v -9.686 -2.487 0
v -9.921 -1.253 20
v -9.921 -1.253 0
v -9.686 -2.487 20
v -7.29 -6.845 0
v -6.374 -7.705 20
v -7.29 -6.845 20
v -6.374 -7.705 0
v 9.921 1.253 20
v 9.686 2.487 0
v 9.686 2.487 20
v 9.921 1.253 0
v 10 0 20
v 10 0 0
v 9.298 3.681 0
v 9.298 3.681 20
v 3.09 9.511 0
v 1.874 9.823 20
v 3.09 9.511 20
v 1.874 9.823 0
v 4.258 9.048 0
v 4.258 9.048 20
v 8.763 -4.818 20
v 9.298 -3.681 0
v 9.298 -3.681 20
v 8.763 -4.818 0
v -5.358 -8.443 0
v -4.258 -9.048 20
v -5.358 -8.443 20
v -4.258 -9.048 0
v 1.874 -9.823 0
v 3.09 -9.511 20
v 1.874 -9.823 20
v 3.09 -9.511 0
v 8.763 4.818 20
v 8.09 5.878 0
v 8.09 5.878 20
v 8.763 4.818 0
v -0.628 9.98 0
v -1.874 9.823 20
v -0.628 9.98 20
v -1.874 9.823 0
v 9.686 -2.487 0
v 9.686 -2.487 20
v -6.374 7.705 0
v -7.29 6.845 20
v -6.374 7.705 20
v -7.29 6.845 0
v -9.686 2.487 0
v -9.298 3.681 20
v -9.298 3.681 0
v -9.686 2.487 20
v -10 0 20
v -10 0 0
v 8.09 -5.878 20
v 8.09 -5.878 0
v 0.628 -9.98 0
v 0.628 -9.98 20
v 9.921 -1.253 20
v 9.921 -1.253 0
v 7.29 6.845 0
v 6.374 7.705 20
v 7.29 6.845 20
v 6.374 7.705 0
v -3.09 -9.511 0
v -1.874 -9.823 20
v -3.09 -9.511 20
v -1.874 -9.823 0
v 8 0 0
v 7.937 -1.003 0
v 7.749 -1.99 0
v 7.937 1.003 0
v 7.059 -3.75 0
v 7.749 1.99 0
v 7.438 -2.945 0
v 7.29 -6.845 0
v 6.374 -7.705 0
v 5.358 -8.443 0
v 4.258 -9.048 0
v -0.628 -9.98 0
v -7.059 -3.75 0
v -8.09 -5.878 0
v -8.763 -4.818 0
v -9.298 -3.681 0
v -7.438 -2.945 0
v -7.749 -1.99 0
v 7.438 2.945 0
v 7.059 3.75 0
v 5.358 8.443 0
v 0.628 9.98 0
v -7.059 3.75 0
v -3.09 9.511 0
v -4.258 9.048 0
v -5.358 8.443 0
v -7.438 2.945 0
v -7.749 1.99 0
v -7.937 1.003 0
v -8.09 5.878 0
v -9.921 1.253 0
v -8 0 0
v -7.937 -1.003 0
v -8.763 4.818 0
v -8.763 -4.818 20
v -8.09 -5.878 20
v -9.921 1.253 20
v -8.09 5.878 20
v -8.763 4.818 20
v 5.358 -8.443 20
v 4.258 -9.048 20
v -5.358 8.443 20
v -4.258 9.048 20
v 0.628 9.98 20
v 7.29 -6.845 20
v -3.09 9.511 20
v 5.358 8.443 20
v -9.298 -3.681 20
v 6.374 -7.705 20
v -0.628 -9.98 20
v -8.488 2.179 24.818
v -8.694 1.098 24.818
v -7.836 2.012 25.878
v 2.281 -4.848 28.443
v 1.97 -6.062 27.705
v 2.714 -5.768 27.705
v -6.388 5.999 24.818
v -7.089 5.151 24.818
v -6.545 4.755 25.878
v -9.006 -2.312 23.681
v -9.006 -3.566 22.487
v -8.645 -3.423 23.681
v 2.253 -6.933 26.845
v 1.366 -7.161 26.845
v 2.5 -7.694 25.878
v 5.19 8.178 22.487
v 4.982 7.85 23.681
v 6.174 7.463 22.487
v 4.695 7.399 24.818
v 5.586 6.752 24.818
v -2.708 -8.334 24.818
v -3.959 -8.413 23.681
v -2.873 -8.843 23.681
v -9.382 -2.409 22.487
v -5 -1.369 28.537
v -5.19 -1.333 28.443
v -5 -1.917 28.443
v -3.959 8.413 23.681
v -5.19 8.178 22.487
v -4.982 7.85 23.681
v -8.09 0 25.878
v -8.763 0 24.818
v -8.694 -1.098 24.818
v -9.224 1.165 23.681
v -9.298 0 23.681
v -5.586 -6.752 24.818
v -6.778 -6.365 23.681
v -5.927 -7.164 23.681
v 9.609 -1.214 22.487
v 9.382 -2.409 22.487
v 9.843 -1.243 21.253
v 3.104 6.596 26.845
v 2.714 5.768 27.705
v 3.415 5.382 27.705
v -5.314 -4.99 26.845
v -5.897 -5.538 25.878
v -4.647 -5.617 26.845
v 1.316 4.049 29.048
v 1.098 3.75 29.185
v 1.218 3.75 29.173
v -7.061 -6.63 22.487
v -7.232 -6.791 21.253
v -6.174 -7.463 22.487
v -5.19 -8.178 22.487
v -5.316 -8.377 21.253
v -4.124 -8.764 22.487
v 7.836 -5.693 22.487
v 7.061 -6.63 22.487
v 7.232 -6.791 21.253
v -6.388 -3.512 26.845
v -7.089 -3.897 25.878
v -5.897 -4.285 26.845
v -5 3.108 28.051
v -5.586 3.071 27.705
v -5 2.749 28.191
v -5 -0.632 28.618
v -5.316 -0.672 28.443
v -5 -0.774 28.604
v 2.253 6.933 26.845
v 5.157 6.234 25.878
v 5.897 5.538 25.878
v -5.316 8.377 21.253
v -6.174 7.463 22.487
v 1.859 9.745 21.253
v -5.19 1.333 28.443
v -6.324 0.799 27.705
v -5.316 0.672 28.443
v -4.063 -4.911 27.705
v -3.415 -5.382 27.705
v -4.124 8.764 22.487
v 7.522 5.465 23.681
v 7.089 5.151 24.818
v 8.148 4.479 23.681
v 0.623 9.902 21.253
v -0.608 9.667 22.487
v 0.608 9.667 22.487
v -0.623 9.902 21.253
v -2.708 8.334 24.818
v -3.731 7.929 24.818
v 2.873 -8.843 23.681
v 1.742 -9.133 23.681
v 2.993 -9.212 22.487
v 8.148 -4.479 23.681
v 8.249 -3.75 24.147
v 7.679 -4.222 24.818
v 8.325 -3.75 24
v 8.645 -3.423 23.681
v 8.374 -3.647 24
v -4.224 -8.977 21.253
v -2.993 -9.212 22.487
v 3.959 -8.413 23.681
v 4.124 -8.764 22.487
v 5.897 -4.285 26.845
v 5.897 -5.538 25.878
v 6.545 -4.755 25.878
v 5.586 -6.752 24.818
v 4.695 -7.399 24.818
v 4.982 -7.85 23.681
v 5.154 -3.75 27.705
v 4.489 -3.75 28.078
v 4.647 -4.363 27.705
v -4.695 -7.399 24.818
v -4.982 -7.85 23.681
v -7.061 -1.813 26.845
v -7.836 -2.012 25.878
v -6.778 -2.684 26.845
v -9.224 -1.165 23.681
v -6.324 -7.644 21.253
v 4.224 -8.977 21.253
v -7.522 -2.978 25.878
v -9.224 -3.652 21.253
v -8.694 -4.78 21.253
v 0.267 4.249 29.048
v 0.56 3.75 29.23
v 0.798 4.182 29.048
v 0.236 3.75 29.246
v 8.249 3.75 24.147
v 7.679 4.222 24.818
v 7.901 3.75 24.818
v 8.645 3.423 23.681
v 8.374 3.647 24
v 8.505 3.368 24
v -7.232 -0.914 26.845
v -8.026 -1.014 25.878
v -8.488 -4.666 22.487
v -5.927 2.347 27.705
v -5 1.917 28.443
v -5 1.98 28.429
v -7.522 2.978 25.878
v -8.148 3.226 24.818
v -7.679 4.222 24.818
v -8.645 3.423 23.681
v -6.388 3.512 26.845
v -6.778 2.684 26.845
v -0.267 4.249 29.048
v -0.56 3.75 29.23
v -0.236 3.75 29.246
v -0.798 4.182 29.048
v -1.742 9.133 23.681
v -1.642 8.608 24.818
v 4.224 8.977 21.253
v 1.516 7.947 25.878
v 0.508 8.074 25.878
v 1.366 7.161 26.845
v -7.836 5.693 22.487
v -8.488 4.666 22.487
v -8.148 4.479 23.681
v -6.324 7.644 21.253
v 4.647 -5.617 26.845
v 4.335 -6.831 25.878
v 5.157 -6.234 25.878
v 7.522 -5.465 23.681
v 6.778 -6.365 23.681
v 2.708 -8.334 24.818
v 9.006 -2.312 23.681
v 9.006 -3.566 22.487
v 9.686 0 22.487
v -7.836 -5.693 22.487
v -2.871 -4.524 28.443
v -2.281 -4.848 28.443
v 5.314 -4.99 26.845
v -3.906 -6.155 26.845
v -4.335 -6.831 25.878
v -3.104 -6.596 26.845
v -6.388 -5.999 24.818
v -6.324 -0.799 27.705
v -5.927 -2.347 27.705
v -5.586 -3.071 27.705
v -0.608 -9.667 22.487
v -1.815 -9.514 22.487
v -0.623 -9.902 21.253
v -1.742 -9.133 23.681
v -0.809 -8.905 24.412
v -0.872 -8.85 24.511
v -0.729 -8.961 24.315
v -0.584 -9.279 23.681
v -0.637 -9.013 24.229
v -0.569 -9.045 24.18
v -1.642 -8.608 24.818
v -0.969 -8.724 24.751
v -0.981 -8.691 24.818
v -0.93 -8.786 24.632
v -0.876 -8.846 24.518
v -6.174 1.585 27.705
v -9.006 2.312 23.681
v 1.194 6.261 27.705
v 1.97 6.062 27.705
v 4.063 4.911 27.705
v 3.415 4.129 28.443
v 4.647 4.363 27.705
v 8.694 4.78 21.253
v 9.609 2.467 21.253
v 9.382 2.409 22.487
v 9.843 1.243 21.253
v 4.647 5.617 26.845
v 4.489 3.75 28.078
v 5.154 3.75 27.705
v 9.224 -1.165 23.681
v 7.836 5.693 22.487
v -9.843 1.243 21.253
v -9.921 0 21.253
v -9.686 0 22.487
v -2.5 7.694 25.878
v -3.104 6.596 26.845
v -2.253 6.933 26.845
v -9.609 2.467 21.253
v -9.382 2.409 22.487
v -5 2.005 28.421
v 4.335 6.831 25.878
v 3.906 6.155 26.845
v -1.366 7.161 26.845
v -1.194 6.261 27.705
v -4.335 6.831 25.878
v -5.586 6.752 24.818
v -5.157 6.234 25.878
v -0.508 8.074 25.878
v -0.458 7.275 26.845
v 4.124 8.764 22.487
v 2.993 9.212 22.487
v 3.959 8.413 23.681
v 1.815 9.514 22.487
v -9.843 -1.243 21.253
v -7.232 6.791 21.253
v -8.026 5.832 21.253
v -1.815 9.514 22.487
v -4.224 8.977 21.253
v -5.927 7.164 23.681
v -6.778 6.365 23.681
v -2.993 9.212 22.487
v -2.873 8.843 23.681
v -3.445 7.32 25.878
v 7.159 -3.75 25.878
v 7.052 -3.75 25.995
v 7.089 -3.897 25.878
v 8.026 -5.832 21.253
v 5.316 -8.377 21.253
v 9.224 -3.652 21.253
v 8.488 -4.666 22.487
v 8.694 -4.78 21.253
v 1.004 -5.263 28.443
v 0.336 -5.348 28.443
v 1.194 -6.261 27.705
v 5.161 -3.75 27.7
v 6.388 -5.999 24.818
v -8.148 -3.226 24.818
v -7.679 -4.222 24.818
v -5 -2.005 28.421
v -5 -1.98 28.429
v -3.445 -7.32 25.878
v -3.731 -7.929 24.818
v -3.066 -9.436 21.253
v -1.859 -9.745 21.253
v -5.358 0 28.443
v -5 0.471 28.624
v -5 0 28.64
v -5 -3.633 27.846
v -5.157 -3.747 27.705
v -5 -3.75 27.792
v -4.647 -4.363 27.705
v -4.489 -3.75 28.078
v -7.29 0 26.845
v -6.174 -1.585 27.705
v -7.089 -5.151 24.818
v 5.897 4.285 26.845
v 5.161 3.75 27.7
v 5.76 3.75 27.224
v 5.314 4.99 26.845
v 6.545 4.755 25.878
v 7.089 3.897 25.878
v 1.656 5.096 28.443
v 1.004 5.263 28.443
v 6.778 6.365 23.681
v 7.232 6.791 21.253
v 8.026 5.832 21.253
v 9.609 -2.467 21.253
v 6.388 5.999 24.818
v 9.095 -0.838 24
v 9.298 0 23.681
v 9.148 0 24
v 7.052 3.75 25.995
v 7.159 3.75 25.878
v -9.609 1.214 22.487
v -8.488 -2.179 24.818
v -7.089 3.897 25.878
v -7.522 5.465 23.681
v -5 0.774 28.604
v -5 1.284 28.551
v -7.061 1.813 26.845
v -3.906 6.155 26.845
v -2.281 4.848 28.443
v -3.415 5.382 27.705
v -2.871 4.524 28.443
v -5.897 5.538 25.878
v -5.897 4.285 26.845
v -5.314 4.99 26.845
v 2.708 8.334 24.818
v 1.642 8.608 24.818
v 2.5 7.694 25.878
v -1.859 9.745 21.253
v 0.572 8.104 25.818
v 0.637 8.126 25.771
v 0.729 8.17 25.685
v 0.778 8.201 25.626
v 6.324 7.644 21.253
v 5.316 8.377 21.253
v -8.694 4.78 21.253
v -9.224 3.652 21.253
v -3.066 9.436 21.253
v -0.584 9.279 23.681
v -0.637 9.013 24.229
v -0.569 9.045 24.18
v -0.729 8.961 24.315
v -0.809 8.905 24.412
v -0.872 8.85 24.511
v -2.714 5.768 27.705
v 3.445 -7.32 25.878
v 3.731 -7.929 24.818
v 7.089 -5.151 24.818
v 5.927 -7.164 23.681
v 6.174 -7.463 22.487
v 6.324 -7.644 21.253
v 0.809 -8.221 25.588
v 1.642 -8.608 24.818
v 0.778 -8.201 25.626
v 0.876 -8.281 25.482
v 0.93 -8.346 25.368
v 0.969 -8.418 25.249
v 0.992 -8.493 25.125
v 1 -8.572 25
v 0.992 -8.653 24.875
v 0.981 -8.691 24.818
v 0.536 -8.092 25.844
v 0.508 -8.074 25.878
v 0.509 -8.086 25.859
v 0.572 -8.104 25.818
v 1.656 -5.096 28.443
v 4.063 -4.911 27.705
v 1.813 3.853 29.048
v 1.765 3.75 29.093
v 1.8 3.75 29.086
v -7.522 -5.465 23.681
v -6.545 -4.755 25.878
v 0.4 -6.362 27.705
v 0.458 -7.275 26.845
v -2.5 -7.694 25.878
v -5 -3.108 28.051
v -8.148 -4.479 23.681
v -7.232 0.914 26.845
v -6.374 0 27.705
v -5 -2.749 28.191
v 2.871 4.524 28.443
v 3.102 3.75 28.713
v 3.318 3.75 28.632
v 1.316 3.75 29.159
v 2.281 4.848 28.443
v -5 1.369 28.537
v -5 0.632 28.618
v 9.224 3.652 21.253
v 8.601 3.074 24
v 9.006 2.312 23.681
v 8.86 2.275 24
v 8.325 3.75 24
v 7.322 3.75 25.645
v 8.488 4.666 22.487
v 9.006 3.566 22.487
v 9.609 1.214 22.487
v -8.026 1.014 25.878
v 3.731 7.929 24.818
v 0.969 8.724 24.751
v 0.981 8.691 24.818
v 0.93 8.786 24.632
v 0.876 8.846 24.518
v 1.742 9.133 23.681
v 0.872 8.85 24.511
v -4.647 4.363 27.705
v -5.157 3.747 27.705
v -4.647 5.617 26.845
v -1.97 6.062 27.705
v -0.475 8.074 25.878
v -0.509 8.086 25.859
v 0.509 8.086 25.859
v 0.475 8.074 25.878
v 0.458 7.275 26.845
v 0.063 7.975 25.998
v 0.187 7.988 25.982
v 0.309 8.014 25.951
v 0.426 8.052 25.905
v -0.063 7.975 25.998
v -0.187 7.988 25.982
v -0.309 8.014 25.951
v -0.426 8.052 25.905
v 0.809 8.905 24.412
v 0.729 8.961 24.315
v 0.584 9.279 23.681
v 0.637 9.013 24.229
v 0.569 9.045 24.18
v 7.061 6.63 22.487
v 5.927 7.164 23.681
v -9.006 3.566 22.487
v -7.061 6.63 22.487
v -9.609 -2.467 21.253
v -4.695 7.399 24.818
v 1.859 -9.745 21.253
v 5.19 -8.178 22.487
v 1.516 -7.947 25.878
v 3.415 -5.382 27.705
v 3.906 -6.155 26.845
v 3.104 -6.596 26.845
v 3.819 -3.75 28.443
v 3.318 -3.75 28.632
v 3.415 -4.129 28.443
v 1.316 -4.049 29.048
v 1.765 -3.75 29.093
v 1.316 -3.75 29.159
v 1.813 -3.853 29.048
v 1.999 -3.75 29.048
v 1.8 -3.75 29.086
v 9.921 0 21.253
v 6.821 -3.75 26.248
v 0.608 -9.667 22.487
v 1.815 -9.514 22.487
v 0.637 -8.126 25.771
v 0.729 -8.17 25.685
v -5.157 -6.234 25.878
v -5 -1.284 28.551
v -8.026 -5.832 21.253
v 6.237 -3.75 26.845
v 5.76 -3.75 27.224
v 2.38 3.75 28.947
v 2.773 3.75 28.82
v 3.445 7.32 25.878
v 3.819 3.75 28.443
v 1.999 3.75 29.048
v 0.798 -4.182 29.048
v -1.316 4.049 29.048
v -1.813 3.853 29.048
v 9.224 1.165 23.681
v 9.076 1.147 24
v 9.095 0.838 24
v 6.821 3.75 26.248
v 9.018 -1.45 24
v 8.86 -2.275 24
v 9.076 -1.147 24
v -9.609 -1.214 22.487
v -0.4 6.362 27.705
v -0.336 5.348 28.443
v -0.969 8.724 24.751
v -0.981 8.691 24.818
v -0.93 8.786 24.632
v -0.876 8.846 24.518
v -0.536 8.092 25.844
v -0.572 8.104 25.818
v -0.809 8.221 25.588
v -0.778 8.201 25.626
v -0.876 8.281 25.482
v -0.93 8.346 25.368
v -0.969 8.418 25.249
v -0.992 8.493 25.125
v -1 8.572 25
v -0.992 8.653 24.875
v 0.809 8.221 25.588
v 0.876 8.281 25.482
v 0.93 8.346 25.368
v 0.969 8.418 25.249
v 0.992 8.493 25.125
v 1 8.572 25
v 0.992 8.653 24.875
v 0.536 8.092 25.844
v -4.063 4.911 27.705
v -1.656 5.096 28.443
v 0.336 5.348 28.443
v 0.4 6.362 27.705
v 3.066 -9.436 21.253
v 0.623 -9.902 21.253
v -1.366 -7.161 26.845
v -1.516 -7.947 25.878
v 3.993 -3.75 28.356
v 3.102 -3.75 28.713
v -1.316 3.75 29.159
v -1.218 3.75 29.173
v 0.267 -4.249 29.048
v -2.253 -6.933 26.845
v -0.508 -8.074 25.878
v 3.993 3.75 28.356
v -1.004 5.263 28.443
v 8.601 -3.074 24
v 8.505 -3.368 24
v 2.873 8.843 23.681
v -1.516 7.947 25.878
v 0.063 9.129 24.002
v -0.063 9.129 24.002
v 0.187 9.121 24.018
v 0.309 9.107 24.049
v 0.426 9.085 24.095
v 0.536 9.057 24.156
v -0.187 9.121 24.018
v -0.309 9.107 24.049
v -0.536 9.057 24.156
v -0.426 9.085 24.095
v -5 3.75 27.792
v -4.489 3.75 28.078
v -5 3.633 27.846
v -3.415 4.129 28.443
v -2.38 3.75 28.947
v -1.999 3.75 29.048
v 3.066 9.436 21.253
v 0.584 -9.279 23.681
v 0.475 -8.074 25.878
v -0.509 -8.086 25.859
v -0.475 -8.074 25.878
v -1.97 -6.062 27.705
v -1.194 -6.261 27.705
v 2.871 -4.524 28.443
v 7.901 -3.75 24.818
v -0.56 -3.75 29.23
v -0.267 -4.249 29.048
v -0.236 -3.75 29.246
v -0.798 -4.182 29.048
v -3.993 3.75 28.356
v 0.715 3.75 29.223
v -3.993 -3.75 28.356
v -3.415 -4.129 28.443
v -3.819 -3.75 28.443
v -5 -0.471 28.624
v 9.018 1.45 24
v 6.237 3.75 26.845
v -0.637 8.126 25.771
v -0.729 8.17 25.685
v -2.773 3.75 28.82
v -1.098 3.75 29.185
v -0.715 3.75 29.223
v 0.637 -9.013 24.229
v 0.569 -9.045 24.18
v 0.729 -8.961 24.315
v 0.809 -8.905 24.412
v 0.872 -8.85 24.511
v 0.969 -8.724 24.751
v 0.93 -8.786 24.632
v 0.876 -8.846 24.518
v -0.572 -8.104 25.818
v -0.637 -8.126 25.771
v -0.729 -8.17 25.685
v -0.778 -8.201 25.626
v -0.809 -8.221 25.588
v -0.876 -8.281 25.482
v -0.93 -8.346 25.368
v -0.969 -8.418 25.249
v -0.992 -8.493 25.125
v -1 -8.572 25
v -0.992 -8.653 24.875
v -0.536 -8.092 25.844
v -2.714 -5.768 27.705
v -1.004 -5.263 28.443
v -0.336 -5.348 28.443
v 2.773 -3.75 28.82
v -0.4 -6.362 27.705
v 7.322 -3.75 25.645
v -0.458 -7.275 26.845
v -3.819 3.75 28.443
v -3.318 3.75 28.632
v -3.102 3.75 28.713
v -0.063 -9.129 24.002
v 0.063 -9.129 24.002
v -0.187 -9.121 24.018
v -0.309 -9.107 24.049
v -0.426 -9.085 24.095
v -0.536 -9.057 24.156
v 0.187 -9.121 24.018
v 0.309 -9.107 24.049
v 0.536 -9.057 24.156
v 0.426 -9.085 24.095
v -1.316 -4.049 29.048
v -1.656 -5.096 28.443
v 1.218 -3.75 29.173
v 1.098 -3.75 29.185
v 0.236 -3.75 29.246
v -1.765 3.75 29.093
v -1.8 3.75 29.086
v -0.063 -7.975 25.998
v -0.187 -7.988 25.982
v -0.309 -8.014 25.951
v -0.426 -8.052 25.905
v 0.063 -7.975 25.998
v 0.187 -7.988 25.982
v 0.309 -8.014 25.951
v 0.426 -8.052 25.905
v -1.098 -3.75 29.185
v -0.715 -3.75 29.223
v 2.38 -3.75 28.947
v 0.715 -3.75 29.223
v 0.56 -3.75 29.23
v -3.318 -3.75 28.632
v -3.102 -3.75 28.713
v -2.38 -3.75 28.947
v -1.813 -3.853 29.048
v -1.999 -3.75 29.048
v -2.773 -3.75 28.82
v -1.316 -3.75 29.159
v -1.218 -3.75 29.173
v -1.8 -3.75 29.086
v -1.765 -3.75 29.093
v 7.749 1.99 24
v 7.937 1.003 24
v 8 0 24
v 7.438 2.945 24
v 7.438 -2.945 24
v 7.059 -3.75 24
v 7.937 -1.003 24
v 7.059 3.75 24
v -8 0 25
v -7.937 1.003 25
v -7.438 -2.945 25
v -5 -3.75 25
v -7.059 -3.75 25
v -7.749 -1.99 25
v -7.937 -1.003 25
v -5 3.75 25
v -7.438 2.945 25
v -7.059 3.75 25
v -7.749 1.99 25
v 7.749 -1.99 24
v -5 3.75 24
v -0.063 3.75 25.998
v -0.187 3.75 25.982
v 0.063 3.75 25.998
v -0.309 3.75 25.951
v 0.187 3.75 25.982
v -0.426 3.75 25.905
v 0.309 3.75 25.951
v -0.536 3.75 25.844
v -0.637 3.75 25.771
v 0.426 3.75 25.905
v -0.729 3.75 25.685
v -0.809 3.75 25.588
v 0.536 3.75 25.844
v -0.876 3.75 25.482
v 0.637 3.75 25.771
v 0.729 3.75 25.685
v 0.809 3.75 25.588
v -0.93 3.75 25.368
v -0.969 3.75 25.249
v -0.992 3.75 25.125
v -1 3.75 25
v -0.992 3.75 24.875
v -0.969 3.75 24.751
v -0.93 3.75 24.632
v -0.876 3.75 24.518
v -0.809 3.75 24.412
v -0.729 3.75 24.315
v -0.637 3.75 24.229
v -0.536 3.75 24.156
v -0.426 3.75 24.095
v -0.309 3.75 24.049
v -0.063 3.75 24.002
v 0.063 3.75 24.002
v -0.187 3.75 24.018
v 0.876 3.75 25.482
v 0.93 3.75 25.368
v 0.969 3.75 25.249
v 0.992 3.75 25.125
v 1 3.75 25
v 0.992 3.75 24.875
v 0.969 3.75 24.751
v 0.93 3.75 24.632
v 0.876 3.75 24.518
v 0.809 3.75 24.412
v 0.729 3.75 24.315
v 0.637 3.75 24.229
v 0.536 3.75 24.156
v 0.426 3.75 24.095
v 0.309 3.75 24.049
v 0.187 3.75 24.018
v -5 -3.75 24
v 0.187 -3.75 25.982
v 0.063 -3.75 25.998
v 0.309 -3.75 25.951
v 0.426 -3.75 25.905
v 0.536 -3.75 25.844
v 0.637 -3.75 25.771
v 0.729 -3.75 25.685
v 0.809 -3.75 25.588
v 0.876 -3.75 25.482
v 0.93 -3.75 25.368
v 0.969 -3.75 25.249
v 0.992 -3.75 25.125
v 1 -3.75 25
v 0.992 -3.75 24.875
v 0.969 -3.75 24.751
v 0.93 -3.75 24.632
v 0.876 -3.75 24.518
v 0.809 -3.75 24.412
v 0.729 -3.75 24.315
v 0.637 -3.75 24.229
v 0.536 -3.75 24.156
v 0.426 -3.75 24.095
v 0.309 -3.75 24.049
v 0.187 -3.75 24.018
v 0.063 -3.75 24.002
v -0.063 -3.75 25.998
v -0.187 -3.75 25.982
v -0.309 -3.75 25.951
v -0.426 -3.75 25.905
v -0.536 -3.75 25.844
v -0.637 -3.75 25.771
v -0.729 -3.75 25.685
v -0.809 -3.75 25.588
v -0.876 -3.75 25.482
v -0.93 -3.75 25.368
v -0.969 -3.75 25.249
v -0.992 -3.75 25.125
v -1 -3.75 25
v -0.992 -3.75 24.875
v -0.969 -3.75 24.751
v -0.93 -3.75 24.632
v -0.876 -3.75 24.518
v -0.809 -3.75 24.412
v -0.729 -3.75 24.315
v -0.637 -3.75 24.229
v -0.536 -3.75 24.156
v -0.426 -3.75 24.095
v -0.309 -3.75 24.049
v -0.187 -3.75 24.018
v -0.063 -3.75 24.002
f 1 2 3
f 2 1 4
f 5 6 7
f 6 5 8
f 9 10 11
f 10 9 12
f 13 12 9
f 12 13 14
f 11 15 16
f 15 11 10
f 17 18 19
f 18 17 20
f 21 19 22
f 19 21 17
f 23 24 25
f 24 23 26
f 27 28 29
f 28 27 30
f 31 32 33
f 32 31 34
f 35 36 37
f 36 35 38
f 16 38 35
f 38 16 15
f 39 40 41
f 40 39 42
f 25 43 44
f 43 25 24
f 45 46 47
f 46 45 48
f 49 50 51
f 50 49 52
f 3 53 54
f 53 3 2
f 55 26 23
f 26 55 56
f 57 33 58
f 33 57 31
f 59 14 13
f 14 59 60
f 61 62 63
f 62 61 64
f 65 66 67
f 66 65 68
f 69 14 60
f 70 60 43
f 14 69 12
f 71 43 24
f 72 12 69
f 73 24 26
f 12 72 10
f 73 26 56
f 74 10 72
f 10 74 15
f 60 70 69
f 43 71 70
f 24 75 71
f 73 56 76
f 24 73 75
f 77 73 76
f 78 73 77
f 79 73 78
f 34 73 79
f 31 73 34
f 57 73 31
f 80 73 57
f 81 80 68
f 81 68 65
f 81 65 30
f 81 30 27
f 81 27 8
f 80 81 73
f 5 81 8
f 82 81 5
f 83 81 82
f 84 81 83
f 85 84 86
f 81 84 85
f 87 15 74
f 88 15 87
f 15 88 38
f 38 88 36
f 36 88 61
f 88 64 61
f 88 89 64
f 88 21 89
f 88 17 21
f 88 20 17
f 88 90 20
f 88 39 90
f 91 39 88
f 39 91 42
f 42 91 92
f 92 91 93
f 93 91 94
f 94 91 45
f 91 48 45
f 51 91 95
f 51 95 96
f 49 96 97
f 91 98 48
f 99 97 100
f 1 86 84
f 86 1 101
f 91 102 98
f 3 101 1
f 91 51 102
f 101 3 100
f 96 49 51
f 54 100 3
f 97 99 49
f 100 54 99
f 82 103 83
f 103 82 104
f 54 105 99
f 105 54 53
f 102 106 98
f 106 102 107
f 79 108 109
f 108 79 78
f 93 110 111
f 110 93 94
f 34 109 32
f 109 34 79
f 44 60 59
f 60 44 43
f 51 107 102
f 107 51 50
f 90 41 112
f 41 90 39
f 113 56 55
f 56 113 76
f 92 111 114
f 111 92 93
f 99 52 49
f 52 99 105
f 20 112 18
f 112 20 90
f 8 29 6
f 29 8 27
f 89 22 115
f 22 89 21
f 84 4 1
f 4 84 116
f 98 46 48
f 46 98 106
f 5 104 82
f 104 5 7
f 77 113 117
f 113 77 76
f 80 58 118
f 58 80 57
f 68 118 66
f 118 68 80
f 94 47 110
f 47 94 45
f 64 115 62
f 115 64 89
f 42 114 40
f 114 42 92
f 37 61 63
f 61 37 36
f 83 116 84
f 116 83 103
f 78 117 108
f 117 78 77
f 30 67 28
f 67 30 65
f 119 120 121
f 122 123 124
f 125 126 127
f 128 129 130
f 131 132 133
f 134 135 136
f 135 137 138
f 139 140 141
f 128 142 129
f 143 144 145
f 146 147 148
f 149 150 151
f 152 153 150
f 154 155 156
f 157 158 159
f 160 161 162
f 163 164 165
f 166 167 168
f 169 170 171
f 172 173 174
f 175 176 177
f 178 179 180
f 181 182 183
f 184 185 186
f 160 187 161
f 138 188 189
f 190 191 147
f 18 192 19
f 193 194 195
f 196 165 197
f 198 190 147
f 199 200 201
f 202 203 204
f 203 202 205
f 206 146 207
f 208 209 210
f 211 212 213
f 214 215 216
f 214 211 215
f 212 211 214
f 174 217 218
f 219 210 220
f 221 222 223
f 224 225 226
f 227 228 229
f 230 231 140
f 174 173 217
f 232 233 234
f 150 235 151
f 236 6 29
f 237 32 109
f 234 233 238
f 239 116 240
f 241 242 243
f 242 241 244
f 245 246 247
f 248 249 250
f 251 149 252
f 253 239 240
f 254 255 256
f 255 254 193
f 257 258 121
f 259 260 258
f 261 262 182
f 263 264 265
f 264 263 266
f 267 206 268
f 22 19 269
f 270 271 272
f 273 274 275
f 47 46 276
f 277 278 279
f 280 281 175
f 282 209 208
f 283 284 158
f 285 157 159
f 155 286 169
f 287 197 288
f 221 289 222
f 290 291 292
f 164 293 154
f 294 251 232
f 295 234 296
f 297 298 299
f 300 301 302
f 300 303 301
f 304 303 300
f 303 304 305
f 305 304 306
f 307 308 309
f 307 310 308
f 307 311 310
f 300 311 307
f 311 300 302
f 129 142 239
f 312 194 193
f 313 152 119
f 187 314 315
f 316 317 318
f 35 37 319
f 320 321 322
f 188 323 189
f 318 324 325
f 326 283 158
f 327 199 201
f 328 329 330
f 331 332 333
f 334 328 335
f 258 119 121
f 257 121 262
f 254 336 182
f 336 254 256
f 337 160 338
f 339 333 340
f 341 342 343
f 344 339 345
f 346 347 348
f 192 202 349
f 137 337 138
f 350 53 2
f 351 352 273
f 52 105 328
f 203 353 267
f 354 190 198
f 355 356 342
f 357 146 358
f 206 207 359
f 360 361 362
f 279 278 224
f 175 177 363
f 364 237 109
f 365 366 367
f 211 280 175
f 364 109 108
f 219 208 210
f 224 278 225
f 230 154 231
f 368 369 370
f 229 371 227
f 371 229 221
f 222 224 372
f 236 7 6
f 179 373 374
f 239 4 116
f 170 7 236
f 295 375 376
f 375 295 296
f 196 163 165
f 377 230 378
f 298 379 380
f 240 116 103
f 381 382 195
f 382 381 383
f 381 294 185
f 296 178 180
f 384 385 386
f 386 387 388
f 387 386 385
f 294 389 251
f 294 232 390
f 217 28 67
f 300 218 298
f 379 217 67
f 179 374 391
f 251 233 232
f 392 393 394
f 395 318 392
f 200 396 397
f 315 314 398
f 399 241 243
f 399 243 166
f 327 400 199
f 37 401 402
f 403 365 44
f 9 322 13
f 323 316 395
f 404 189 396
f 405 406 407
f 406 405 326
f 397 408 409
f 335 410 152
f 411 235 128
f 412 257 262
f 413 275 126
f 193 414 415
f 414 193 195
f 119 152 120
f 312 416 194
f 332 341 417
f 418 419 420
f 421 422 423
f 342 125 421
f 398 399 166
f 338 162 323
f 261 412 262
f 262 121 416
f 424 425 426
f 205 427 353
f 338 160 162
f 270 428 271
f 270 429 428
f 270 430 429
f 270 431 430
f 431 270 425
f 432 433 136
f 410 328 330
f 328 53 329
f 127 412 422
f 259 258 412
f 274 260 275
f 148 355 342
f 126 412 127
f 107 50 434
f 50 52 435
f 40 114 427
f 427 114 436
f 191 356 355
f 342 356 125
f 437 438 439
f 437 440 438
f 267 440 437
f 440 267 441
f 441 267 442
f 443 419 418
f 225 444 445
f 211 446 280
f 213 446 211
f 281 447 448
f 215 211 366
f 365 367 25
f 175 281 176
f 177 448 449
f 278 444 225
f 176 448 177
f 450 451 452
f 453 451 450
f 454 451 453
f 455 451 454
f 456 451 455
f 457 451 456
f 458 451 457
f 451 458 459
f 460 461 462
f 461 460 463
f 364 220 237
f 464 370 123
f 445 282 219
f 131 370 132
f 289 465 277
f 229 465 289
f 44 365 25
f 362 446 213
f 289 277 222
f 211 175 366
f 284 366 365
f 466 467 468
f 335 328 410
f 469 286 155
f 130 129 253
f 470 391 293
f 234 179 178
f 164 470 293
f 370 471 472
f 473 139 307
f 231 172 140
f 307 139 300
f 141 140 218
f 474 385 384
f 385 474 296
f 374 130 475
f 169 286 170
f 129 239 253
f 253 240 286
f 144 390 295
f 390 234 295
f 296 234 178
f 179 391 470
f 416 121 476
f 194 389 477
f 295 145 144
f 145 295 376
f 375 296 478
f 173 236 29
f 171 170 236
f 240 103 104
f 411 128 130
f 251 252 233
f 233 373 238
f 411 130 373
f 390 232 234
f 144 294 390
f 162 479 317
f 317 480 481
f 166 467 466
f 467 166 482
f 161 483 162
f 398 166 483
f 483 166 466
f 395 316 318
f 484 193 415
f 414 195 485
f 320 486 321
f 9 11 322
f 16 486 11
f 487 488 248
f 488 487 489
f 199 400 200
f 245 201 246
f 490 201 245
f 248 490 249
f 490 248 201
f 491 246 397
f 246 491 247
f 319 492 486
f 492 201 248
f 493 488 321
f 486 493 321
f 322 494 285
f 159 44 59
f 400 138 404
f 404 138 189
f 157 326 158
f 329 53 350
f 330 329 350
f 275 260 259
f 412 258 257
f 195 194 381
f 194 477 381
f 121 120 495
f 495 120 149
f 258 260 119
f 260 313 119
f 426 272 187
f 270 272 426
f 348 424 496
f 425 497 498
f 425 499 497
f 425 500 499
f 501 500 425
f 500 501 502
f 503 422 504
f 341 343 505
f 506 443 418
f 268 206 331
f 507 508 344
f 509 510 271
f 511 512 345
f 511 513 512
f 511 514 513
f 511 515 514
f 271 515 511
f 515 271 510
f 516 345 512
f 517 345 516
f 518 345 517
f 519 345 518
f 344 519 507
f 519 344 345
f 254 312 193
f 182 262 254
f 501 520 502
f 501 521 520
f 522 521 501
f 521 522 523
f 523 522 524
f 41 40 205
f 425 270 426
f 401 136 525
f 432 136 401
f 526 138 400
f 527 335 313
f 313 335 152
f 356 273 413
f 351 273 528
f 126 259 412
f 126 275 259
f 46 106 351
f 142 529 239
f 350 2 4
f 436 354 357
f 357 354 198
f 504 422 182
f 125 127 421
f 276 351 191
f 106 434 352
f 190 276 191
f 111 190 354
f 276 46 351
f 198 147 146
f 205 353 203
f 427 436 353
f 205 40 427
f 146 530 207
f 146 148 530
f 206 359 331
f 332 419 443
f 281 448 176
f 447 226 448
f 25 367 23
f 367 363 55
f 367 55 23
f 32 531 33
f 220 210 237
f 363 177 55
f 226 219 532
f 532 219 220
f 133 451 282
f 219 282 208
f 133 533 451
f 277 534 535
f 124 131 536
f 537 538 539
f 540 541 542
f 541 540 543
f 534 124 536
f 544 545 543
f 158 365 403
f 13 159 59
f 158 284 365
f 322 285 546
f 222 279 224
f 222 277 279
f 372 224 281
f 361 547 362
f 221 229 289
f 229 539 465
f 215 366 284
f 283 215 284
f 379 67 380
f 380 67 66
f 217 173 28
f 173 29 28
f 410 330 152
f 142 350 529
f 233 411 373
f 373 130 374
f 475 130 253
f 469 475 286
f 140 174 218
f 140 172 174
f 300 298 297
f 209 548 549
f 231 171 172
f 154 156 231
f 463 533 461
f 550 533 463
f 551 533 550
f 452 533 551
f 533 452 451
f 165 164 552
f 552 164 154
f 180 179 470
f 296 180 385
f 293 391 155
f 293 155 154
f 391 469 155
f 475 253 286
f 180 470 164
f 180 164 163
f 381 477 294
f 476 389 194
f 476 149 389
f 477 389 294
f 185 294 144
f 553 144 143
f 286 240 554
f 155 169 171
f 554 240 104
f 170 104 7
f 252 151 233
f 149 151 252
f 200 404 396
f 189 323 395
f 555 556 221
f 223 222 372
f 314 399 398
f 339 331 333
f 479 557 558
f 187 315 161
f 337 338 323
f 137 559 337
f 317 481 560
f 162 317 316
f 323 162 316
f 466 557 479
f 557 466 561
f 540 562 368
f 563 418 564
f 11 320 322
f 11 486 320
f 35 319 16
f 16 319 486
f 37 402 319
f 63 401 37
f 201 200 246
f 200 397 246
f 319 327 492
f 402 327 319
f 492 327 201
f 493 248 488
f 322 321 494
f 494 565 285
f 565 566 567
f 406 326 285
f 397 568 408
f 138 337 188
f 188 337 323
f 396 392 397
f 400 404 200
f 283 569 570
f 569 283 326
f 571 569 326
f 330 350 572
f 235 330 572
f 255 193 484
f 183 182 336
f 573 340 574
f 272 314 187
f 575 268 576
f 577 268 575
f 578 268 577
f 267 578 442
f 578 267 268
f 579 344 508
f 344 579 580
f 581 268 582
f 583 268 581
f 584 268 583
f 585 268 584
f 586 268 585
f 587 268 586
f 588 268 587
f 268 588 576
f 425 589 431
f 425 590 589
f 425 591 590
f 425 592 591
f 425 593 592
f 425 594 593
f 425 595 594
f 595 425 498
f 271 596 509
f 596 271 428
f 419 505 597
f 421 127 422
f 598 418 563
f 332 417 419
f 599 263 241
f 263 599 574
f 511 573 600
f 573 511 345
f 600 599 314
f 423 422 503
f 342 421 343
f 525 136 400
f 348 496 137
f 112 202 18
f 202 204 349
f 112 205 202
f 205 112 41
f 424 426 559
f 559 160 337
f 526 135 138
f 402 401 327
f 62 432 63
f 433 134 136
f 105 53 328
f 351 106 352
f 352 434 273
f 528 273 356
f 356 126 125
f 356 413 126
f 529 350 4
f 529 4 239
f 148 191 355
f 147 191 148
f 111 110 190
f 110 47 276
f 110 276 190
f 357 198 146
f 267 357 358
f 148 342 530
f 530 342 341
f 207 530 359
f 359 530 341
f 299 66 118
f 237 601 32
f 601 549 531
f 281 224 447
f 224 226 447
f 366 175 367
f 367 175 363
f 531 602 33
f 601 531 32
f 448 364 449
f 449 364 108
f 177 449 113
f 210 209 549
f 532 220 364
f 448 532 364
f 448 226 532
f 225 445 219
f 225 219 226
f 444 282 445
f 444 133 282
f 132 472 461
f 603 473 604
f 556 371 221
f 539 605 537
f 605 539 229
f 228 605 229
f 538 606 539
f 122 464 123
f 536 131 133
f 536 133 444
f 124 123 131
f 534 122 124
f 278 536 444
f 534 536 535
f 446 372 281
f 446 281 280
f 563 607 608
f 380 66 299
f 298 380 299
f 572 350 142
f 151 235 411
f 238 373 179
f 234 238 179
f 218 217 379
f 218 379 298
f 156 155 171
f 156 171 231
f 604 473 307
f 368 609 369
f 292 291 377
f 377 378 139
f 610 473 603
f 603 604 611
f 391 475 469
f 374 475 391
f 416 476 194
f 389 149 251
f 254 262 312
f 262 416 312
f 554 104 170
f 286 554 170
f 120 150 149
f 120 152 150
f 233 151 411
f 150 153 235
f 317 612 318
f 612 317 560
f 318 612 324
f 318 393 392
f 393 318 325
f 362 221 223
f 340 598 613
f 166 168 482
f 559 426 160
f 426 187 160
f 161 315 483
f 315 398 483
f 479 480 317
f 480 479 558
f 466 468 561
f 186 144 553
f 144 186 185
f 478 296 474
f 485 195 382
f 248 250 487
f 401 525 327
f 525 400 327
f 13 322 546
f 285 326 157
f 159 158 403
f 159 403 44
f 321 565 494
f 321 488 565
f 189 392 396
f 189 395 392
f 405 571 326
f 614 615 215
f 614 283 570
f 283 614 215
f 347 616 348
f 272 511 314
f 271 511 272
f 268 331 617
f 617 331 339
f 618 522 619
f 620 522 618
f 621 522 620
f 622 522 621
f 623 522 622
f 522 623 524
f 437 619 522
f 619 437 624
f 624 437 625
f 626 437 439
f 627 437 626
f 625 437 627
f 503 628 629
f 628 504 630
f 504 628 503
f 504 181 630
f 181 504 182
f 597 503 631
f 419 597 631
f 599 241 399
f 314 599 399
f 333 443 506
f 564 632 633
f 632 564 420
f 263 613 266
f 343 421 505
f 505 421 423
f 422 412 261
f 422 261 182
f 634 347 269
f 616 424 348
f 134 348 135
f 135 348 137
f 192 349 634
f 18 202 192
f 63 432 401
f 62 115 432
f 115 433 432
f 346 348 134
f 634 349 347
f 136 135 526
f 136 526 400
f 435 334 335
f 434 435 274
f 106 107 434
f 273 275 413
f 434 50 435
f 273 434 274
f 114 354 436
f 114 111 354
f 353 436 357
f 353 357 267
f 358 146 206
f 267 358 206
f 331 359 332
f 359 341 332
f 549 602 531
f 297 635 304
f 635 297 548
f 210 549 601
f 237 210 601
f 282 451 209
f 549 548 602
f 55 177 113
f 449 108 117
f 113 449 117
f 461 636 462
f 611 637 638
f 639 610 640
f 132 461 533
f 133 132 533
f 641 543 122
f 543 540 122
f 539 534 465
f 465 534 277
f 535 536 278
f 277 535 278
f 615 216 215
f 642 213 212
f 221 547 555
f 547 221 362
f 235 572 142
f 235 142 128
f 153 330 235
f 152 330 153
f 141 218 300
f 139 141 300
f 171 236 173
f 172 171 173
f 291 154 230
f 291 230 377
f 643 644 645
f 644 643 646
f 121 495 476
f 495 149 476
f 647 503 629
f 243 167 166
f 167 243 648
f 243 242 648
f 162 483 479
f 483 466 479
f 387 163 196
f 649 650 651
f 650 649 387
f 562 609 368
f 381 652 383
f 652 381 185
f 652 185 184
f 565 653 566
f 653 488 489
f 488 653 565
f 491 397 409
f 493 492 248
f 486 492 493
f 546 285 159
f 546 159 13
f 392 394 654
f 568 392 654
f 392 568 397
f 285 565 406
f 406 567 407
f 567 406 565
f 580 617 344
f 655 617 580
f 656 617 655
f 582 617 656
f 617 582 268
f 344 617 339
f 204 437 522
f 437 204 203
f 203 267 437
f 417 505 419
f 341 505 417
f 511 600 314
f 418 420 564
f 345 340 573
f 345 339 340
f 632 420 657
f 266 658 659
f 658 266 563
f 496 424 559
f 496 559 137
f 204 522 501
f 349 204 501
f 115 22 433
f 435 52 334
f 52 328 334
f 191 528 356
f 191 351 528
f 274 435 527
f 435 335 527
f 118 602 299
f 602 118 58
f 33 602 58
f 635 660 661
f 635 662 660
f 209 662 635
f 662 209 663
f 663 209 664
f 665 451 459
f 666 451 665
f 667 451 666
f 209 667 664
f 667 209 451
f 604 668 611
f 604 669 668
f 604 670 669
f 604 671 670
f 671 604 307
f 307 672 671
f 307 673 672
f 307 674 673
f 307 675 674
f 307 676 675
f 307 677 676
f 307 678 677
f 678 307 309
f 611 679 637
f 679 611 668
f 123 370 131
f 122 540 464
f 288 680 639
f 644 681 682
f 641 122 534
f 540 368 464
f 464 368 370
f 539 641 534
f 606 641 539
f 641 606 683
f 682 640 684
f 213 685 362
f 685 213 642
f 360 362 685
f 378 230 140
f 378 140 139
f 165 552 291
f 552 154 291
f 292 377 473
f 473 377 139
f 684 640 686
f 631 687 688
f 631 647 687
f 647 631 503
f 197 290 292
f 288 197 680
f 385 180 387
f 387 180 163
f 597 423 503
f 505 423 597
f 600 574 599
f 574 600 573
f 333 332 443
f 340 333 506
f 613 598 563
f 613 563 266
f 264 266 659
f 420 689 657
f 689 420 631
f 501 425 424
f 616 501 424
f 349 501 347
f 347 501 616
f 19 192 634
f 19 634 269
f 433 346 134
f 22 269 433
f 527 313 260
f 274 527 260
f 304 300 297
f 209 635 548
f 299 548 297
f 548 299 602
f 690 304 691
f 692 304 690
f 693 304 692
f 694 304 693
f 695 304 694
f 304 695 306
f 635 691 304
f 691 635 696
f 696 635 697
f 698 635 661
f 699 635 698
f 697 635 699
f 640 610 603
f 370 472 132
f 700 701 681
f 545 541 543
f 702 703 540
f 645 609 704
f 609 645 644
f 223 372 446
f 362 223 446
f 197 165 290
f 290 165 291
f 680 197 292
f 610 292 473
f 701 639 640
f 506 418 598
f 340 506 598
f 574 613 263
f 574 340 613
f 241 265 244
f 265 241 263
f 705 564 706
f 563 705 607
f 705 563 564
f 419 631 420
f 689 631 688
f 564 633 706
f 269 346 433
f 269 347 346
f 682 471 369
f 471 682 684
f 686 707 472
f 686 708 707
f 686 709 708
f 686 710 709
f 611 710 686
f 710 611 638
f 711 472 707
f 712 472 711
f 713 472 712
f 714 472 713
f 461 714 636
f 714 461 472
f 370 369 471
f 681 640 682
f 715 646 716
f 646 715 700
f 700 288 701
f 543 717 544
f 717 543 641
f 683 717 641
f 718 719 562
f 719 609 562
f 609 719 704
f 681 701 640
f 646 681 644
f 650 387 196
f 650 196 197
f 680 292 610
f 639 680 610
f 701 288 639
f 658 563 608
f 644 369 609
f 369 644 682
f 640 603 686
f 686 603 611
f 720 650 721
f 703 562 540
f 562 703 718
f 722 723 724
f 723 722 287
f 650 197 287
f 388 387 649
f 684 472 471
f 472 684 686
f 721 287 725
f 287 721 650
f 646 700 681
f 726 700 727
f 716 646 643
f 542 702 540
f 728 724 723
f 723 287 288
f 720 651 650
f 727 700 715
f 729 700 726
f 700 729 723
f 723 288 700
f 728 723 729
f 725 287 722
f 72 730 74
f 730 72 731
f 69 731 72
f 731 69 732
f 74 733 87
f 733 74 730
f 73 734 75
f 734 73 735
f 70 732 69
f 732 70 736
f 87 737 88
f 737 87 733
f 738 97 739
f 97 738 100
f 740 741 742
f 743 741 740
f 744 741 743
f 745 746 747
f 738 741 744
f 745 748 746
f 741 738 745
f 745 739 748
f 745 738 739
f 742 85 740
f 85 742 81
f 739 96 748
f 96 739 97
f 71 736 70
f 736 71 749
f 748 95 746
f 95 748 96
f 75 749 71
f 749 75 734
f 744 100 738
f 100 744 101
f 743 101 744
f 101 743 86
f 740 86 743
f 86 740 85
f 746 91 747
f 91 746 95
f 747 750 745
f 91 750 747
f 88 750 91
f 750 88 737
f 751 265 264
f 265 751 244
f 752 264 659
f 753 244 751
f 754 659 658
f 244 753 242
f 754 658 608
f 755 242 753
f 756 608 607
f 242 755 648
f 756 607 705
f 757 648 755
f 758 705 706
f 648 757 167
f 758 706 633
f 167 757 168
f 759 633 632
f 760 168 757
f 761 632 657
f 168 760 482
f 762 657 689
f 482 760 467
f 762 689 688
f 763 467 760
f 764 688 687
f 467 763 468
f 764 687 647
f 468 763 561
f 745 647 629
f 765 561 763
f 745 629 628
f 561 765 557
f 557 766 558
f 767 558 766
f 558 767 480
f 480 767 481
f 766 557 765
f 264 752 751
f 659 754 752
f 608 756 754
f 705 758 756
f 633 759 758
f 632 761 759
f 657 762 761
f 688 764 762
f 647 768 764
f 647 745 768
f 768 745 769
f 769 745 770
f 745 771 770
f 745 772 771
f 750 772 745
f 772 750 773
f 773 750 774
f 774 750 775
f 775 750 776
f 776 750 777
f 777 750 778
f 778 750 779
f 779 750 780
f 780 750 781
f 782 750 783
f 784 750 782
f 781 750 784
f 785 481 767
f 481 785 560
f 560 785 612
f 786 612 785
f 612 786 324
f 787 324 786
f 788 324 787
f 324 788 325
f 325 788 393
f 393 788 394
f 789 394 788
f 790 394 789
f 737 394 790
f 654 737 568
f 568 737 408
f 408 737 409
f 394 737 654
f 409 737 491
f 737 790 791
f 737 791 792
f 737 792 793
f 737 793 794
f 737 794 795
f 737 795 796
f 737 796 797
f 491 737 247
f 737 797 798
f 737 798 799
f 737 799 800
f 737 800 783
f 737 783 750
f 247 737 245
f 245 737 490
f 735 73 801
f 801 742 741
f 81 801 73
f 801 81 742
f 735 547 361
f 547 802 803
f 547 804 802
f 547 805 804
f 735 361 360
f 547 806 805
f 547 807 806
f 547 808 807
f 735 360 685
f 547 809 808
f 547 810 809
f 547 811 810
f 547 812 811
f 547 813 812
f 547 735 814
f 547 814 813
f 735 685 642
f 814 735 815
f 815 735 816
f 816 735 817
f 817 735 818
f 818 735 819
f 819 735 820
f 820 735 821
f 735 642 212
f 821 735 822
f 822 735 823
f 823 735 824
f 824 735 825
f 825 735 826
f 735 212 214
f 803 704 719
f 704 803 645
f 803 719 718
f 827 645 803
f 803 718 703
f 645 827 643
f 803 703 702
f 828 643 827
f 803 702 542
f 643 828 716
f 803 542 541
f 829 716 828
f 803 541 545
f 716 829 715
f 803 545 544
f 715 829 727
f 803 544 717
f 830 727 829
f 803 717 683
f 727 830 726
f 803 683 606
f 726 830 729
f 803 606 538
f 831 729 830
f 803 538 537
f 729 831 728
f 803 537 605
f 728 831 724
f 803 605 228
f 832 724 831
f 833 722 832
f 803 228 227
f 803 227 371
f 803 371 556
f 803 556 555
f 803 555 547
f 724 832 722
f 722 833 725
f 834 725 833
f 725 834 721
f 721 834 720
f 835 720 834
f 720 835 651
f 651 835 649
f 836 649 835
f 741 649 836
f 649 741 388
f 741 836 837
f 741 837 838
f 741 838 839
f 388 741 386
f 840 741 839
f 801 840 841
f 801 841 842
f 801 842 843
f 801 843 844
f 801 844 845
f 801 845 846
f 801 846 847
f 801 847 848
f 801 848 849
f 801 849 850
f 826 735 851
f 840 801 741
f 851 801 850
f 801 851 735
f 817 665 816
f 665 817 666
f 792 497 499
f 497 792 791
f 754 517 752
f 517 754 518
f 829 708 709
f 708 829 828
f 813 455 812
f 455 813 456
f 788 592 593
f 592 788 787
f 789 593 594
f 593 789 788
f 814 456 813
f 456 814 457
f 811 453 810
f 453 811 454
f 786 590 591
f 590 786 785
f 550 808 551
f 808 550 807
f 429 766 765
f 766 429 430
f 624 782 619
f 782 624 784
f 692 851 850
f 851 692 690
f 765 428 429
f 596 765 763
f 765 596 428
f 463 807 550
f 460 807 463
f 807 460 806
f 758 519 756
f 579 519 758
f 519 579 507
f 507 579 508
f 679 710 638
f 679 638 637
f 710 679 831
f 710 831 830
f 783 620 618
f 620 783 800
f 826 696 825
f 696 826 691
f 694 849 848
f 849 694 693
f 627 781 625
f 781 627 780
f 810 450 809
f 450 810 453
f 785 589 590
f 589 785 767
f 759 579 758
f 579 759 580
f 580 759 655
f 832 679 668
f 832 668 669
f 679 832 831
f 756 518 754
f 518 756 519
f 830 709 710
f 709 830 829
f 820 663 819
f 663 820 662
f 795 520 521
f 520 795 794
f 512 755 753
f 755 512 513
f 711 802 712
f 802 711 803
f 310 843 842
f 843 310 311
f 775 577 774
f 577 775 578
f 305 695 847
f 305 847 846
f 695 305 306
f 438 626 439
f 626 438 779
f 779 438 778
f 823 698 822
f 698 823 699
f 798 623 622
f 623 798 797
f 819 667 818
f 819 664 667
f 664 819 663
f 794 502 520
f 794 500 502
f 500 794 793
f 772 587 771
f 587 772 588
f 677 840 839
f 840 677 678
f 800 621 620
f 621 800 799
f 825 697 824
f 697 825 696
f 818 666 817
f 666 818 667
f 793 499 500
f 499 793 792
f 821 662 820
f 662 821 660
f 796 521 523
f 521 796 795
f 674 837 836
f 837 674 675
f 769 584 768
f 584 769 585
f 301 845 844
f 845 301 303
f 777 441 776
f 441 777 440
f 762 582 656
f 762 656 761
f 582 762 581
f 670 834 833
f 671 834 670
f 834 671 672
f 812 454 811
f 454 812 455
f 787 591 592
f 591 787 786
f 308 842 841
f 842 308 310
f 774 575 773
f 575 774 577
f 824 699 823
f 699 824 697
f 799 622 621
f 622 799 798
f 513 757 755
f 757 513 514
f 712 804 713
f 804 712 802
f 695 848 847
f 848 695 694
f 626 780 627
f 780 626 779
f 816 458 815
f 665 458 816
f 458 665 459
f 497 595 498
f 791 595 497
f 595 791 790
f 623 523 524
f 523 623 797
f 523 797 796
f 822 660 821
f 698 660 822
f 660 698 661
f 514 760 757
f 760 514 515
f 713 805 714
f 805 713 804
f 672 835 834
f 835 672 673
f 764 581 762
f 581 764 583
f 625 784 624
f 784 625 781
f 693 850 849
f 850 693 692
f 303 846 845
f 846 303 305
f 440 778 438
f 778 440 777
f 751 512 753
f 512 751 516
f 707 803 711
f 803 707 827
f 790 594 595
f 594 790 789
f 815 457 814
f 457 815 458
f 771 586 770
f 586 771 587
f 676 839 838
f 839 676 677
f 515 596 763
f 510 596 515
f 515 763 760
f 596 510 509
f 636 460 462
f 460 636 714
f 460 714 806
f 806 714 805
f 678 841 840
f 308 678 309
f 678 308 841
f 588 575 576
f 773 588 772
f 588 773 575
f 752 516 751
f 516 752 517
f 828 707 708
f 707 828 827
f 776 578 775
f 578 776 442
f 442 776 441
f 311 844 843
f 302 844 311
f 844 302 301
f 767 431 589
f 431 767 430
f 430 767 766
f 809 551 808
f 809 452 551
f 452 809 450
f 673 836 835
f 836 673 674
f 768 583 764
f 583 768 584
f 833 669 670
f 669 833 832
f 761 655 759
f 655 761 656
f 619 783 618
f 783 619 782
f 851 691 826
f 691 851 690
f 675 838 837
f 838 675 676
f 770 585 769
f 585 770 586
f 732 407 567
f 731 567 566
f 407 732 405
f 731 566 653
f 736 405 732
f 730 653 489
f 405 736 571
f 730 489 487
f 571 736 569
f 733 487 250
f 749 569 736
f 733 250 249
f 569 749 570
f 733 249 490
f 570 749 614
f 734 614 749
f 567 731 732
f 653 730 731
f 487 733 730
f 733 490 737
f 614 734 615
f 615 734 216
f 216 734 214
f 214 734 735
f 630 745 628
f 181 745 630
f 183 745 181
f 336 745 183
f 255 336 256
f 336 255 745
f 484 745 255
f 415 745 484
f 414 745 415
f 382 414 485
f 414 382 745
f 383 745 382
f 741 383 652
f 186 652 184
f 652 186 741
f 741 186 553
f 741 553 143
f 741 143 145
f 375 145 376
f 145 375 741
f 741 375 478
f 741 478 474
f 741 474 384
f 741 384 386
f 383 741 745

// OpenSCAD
//scale of the full design
SCALE = 1;

//resolution of the outer design (~50 MAX)
RESOLUTION =50;

//total height of the design
TOTAL_HEIGHT = 30 * SCALE;

//radius of the design
F_RADIUS = 10 * SCALE;

//height of the cylinder portion
F_HEIGHT = (TOTAL_HEIGHT - F_RADIUS);

//wall thickness
F_THICK = 2 * SCALE;

//internal cylinder joint
C_RADIUS = 5 * SCALE;

//radius of the joint connector hole
H_RADIUS = 1 * SCALE;

//length of the top cutout
S_LENGTH = 1.5 * C_RADIUS;

difference()
{
  union()
  {
    cylinder($fn = RESOLUTION,F_HEIGHT, F_RADIUS, F_RADIUS);
    translate([0, 0, F_HEIGHT])
    sphere($fn = RESOLUTION, F_RADIUS);
  }
  difference()
  {
    #cylinder($fn = RESOLUTION,TOTAL_HEIGHT - F_RADIUS/2, F_RADIUS -  F_THICK, F_RADIUS - F_THICK);
    
    translate([-F_RADIUS, F_RADIUS -(F_RADIUS * 2 - S_LENGTH)/2, 0])
    #cube([F_RADIUS * 2, F_RADIUS, TOTAL_HEIGHT - F_RADIUS/2]);
    
    translate([-F_RADIUS, -F_RADIUS*2 +(F_RADIUS * 2 - S_LENGTH)/2, 0])
    #cube([F_RADIUS * 2, F_RADIUS, TOTAL_HEIGHT - F_RADIUS/2]);
  }
 
  translate([0, ((F_RADIUS + 2) * 2) / 2, TOTAL_HEIGHT - F_RADIUS / 2])
  rotate(90, [1,0,0])
  #cylinder($fn = RESOLUTION,(F_RADIUS + 2) * 2, H_RADIUS, H_RADIUS);
  
  translate([-F_RADIUS / 2, -S_LENGTH / 2, TOTAL_HEIGHT - F_RADIUS/2 - H_RADIUS])
  #cube([F_RADIUS * 9/2, S_LENGTH, F_HEIGHT]);
}
